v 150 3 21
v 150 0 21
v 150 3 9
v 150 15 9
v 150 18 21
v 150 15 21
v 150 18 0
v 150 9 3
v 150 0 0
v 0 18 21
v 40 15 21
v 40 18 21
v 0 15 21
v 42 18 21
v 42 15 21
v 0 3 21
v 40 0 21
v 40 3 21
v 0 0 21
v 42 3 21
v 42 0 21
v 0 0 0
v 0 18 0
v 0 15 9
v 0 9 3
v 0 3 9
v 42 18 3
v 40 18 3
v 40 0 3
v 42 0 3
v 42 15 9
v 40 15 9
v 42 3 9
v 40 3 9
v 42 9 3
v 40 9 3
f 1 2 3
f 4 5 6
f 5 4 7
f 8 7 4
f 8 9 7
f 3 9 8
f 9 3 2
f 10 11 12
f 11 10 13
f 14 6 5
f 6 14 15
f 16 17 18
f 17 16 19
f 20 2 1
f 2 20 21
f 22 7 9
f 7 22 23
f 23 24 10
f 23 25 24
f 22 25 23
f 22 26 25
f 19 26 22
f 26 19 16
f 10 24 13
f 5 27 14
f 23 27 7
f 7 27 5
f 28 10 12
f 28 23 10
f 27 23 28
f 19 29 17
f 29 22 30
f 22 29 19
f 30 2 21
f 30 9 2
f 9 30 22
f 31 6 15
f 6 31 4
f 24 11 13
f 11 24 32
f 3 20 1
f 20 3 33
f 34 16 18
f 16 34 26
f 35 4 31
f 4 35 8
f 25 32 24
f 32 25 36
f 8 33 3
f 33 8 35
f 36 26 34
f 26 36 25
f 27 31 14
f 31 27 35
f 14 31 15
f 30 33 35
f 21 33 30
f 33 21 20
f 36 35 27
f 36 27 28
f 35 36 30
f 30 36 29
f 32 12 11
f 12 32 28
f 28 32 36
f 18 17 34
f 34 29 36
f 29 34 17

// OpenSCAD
length=150; // [50:150]
diameter=12; // [5:50]
thickness=3; // [2:10]
notch_distance=40; // [10:40]
notch_width=2; // [2:5]

/* [Hidden] */

height=thickness + diameter * 1.5;
width=diameter + thickness * 2;

difference() {
    cube([length, width, height]);
    // top retangular channel
    translate([0, thickness, thickness + diameter * 0.5]) cube([length, diameter, diameter * 1.5]);

    // V 
    translate([0, thickness, thickness + diameter * 0.5]) rotate([90,0,0]) rotate([0,90,0]) linear_extrude(length) polygon([
    [0, 1],
    [0,0],
    [diameter * 0.5, -diameter * 0.5],
    [diameter, 0],
    [diameter, 1]
    ]);
    
    // notch
    translate([notch_distance, 0, thickness]) cube([notch_width, thickness * 2 + diameter, diameter * 1.5]);
}
